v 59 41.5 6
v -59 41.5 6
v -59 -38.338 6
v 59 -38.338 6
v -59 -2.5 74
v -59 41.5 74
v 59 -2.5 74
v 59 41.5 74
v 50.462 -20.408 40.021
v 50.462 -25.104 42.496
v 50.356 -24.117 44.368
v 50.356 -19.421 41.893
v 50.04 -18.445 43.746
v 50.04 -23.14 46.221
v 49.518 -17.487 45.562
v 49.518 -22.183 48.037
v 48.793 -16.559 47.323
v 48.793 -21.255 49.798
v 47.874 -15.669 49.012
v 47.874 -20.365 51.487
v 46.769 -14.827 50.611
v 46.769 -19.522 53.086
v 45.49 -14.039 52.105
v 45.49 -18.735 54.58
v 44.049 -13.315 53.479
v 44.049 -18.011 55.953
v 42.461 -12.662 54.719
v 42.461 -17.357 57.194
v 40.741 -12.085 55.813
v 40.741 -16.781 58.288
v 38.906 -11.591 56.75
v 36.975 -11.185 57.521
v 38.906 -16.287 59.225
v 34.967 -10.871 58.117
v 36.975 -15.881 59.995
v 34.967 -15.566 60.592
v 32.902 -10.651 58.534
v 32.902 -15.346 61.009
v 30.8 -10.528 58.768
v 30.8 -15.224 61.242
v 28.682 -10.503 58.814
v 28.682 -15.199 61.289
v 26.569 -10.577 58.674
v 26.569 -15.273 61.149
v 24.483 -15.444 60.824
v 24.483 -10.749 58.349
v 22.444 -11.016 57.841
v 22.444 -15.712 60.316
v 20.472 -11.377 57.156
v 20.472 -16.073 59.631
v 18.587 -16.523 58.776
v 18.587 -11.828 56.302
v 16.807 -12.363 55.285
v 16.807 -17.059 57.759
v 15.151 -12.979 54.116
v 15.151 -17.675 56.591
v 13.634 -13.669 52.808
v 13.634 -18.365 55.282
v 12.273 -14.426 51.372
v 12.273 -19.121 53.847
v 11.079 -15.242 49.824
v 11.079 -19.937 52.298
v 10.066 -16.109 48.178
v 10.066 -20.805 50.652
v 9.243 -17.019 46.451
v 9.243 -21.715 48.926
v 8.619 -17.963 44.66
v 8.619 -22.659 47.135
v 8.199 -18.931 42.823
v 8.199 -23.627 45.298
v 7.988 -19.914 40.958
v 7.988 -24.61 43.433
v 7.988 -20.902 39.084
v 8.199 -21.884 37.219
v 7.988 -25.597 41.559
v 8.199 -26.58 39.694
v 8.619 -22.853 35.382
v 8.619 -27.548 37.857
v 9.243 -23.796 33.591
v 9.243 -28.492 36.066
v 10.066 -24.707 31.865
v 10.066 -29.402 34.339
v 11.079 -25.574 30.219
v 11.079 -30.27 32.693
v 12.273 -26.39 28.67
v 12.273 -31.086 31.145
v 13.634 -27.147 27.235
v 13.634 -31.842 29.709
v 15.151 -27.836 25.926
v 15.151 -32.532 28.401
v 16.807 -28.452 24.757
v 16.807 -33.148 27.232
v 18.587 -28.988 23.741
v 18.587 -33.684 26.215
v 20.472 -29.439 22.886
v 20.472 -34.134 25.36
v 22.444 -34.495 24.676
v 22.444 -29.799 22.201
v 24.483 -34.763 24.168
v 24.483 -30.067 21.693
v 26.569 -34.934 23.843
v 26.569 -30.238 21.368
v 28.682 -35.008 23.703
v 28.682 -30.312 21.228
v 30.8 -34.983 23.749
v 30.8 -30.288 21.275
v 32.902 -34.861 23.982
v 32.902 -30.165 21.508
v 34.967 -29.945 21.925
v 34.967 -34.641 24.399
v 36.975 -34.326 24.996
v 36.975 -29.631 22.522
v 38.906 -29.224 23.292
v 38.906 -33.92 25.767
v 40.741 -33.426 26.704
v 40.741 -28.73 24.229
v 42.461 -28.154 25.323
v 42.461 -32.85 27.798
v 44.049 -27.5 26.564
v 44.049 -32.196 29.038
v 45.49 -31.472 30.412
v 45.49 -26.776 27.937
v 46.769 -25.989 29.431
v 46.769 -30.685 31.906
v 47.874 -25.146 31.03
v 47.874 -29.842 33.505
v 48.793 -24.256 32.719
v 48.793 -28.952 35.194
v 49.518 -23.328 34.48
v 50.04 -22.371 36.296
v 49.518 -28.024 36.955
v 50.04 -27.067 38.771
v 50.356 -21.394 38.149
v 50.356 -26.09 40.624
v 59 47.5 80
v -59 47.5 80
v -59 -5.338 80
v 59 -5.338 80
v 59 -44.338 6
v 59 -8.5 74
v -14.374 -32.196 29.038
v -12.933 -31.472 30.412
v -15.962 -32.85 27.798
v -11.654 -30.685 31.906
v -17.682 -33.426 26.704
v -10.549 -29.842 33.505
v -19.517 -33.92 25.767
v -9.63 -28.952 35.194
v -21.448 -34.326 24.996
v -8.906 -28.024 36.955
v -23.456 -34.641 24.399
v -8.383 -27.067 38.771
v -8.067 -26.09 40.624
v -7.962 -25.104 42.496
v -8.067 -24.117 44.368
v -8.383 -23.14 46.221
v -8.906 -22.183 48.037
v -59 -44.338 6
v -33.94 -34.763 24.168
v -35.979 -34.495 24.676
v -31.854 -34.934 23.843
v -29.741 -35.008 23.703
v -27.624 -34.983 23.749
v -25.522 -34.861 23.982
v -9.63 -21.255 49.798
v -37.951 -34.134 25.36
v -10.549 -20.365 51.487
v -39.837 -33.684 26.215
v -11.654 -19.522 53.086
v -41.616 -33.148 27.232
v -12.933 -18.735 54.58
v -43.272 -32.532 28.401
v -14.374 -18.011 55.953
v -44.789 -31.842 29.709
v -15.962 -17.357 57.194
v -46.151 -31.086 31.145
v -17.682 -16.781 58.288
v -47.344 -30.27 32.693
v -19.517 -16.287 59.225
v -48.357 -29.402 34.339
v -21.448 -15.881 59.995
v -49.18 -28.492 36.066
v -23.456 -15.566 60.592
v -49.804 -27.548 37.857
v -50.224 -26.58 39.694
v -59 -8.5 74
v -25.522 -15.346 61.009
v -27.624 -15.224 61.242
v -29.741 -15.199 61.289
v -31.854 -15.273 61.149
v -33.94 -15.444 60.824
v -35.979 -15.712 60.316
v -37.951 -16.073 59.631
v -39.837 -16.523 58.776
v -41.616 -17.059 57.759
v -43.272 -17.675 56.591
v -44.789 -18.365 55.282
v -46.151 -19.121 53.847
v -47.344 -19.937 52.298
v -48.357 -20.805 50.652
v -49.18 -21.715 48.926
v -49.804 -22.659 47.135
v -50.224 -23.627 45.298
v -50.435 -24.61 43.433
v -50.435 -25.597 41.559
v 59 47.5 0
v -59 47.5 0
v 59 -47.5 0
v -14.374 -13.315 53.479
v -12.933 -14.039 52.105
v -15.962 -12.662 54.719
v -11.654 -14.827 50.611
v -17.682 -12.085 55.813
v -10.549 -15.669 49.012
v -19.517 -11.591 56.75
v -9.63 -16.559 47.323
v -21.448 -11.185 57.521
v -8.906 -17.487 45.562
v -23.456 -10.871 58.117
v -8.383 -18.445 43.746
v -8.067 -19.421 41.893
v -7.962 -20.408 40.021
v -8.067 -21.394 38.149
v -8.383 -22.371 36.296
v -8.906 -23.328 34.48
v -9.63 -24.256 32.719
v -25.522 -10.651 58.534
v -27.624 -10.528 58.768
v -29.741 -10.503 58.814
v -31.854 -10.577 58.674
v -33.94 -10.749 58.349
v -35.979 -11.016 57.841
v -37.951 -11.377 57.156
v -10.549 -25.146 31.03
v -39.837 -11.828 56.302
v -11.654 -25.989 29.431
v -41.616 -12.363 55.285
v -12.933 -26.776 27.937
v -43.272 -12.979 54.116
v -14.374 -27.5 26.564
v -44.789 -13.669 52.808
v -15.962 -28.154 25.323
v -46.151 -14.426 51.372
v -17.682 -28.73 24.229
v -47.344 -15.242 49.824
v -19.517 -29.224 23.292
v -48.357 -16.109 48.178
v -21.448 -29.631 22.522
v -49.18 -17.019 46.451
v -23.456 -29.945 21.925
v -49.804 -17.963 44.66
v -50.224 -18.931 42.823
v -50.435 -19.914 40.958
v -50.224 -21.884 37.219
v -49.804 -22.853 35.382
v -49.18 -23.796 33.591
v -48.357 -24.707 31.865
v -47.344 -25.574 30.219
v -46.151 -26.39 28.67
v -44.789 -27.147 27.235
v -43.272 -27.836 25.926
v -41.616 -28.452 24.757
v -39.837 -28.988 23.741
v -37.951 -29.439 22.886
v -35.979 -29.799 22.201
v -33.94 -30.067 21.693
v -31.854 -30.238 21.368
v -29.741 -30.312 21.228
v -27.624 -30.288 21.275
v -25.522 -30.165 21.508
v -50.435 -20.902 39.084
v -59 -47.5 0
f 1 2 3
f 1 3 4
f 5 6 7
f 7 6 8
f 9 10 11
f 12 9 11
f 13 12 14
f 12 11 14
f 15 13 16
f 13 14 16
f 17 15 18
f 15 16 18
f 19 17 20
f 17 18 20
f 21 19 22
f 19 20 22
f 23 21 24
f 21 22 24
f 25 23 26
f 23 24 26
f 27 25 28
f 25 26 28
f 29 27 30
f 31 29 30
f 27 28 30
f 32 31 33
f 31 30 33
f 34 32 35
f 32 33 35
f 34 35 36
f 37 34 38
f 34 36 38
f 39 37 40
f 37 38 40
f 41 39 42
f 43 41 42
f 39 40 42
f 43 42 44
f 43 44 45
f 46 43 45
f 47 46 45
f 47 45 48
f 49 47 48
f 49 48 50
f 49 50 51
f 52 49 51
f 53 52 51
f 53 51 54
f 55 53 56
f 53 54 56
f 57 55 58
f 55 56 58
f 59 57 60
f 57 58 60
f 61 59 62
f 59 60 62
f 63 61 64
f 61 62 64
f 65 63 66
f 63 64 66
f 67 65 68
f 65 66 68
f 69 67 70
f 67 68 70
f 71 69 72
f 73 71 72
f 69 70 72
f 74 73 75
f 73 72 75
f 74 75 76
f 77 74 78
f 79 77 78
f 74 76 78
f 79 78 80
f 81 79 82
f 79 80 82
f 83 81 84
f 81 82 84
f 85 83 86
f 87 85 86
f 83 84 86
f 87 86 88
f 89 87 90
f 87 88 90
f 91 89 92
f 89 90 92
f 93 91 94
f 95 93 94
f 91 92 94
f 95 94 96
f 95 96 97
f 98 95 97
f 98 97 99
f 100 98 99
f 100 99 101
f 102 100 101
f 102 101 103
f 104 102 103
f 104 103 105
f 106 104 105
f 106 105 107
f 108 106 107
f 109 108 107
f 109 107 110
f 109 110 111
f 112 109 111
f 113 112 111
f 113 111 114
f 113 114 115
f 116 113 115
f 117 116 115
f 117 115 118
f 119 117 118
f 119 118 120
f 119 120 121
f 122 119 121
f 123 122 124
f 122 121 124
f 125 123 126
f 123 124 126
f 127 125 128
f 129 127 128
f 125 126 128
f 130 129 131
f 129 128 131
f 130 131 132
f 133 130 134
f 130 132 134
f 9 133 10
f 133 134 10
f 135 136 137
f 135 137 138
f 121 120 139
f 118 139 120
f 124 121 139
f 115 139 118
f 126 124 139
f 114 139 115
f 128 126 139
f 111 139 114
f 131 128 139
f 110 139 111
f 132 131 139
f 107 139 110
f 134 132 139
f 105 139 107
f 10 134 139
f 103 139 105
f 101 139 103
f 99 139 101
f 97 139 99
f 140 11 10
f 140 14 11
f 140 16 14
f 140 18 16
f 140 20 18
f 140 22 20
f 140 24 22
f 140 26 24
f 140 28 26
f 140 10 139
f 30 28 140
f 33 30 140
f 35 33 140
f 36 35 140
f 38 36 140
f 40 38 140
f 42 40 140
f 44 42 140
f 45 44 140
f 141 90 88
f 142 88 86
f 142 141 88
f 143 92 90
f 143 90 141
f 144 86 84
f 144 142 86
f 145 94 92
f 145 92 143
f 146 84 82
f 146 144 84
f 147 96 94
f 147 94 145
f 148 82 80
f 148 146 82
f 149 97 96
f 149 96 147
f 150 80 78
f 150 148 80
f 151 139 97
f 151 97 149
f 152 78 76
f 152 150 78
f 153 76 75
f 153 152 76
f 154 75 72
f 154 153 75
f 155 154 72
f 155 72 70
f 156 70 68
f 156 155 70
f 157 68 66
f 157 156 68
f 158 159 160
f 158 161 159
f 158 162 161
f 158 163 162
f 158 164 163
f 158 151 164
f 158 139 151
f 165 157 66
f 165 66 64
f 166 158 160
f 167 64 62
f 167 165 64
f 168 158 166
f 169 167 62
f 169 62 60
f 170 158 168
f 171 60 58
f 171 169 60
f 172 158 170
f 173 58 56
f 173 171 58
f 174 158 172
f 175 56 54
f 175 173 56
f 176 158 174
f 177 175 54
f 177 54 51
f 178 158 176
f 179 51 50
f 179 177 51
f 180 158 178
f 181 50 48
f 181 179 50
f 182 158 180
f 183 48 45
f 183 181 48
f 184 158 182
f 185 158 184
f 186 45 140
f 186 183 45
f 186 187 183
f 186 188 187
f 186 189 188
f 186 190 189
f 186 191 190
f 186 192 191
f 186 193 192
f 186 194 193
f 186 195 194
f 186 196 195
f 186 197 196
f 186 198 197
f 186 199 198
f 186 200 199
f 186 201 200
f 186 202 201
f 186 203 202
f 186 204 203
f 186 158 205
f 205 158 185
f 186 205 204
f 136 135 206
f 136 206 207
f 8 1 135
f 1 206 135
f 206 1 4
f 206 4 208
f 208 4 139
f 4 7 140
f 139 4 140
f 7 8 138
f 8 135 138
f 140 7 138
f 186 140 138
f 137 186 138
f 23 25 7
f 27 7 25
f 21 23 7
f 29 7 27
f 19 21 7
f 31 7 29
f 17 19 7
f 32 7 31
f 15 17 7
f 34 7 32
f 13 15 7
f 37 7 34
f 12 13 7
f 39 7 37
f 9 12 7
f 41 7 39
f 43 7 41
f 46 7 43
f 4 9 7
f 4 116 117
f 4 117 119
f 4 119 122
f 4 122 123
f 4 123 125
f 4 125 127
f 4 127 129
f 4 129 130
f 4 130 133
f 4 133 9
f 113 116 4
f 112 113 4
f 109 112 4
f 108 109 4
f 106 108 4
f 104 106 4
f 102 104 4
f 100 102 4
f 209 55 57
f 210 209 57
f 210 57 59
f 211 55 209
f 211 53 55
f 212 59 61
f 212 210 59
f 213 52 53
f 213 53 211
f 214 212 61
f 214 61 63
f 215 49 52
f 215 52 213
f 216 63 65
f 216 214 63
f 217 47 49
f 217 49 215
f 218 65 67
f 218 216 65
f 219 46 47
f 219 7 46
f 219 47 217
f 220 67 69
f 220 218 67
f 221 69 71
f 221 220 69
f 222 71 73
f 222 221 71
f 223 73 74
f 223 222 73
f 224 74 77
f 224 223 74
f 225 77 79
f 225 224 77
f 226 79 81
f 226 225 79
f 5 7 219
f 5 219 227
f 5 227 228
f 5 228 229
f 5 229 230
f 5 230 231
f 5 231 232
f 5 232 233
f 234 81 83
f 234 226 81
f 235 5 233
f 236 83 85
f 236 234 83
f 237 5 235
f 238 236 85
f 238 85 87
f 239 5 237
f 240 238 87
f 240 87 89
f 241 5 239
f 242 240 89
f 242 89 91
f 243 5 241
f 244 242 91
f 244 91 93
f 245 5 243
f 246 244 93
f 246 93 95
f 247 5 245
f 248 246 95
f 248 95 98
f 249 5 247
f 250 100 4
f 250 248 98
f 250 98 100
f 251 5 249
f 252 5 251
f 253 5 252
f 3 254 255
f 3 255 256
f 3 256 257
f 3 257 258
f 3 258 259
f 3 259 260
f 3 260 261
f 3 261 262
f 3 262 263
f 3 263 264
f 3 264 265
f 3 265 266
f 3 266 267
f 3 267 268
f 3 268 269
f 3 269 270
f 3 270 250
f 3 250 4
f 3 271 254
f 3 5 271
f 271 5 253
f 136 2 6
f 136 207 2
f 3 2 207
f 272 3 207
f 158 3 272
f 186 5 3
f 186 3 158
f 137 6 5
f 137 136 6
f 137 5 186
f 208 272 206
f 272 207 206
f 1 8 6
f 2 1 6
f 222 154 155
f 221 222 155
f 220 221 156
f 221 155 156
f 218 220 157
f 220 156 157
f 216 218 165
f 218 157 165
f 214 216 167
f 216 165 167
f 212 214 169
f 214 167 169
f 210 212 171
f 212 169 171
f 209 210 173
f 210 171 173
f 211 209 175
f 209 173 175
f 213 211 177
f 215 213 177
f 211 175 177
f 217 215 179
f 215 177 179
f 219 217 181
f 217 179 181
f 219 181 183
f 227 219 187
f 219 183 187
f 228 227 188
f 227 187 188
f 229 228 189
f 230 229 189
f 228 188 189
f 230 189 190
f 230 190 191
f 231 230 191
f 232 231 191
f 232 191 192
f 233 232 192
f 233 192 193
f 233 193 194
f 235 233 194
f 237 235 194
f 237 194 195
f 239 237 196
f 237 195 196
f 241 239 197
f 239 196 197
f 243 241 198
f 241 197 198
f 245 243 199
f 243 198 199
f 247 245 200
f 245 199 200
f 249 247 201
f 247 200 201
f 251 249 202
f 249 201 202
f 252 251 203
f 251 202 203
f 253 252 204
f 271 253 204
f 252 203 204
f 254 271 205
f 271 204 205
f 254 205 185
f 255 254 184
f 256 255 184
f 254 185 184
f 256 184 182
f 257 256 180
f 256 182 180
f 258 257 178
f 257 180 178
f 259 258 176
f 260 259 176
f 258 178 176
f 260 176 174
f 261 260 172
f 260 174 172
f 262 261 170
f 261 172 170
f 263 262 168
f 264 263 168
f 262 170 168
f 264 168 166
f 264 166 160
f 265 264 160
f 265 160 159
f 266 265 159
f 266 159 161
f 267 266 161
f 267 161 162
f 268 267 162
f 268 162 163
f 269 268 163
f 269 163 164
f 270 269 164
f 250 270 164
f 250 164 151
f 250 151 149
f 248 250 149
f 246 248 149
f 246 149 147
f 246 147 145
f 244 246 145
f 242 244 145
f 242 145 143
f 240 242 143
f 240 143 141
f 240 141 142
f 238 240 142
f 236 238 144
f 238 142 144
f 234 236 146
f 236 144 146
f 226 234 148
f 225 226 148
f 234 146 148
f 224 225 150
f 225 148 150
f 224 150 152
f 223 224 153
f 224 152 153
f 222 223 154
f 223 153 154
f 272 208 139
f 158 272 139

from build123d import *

# Parameters (mm, degrees)
F0_W      = 118
F0_H      = 95
F1_DEPTH  = 6
F2_W      = 118
F2_H      = 74
F3_DEPTH  = 6
F4_W      = 118
F4_H      = 6
F5_DEPTH  = 50
F7_DEPTH  = 118
F9_DEPTH  = 118.001
F11_R     = 21.25
F12_DEPTH = 5.3079525657


with BuildPart() as f1:
    # F0 (on Top) → F1 (new body)
    with BuildSketch(Plane.XY):
        Rectangle(F0_W, F0_H)
    extrude(amount=F1_DEPTH)

    # F2 (on face) → F3 (join)
    with BuildSketch(Plane(origin=(0, 47.5, 0), x_dir=(-1, 0, 0), z_dir=(0, 1, 0))):
        with Locations((0, 43)):
            Rectangle(F2_W, F2_H)
    extrude(amount=-F3_DEPTH)

    # F4 (on face) → F5 (join)
    with BuildSketch(Plane.XZ.offset(-41.5)):
        with Locations((0, 77)):
            Rectangle(F4_W, F4_H)
    extrude(amount=F5_DEPTH)

    # F6 (on face) → F7 (join)
    with BuildSketch(Plane(origin=(-59, 0, 0), x_dir=(0, -1, 0), z_dir=(-1, 0, 0))):
        Polygon((38.3378378378, 6), (44.3378378378, 6), (8.5, 74), (2.5, 74), align=None)
        Polygon((2.5, 74), (8.5, 74), (5.3378378378, 80), (-0.6621621622, 80), align=None)
        Polygon((41.5, 0), (47.5, 0), (44.3378378378, 6), (38.3378378378, 6), align=None)
    extrude(amount=-F7_DEPTH)

    # F8 (on face) → F9 (cut, through all)
    with BuildSketch(Plane.YZ.offset(59)):
        Polygon((-47.5, 6), (-47.5, 0), (-44.3378378378, 6), align=None)
        Polygon((-8.5, 80), (-8.5, 74), (-5.3378378378, 80), align=None)
    extrude(amount=-F9_DEPTH, mode=Mode.SUBTRACT)

    # F11 (on face) → F12 (cut, through all)
    with BuildSketch(Plane(origin=(0, -37.1745033586, 19.5919679863), x_dir=(1, 0, 0), z_dir=(0, -0.884658761, 0.4662390767))):
        with Locations((-29.2115788907, 25.8900932968)):
            Circle(F11_R)
        with Locations((29.2115788907, 25.8900932968)):
            Circle(F11_R)
    extrude(amount=-F12_DEPTH, mode=Mode.SUBTRACT)


solid = f1.part
